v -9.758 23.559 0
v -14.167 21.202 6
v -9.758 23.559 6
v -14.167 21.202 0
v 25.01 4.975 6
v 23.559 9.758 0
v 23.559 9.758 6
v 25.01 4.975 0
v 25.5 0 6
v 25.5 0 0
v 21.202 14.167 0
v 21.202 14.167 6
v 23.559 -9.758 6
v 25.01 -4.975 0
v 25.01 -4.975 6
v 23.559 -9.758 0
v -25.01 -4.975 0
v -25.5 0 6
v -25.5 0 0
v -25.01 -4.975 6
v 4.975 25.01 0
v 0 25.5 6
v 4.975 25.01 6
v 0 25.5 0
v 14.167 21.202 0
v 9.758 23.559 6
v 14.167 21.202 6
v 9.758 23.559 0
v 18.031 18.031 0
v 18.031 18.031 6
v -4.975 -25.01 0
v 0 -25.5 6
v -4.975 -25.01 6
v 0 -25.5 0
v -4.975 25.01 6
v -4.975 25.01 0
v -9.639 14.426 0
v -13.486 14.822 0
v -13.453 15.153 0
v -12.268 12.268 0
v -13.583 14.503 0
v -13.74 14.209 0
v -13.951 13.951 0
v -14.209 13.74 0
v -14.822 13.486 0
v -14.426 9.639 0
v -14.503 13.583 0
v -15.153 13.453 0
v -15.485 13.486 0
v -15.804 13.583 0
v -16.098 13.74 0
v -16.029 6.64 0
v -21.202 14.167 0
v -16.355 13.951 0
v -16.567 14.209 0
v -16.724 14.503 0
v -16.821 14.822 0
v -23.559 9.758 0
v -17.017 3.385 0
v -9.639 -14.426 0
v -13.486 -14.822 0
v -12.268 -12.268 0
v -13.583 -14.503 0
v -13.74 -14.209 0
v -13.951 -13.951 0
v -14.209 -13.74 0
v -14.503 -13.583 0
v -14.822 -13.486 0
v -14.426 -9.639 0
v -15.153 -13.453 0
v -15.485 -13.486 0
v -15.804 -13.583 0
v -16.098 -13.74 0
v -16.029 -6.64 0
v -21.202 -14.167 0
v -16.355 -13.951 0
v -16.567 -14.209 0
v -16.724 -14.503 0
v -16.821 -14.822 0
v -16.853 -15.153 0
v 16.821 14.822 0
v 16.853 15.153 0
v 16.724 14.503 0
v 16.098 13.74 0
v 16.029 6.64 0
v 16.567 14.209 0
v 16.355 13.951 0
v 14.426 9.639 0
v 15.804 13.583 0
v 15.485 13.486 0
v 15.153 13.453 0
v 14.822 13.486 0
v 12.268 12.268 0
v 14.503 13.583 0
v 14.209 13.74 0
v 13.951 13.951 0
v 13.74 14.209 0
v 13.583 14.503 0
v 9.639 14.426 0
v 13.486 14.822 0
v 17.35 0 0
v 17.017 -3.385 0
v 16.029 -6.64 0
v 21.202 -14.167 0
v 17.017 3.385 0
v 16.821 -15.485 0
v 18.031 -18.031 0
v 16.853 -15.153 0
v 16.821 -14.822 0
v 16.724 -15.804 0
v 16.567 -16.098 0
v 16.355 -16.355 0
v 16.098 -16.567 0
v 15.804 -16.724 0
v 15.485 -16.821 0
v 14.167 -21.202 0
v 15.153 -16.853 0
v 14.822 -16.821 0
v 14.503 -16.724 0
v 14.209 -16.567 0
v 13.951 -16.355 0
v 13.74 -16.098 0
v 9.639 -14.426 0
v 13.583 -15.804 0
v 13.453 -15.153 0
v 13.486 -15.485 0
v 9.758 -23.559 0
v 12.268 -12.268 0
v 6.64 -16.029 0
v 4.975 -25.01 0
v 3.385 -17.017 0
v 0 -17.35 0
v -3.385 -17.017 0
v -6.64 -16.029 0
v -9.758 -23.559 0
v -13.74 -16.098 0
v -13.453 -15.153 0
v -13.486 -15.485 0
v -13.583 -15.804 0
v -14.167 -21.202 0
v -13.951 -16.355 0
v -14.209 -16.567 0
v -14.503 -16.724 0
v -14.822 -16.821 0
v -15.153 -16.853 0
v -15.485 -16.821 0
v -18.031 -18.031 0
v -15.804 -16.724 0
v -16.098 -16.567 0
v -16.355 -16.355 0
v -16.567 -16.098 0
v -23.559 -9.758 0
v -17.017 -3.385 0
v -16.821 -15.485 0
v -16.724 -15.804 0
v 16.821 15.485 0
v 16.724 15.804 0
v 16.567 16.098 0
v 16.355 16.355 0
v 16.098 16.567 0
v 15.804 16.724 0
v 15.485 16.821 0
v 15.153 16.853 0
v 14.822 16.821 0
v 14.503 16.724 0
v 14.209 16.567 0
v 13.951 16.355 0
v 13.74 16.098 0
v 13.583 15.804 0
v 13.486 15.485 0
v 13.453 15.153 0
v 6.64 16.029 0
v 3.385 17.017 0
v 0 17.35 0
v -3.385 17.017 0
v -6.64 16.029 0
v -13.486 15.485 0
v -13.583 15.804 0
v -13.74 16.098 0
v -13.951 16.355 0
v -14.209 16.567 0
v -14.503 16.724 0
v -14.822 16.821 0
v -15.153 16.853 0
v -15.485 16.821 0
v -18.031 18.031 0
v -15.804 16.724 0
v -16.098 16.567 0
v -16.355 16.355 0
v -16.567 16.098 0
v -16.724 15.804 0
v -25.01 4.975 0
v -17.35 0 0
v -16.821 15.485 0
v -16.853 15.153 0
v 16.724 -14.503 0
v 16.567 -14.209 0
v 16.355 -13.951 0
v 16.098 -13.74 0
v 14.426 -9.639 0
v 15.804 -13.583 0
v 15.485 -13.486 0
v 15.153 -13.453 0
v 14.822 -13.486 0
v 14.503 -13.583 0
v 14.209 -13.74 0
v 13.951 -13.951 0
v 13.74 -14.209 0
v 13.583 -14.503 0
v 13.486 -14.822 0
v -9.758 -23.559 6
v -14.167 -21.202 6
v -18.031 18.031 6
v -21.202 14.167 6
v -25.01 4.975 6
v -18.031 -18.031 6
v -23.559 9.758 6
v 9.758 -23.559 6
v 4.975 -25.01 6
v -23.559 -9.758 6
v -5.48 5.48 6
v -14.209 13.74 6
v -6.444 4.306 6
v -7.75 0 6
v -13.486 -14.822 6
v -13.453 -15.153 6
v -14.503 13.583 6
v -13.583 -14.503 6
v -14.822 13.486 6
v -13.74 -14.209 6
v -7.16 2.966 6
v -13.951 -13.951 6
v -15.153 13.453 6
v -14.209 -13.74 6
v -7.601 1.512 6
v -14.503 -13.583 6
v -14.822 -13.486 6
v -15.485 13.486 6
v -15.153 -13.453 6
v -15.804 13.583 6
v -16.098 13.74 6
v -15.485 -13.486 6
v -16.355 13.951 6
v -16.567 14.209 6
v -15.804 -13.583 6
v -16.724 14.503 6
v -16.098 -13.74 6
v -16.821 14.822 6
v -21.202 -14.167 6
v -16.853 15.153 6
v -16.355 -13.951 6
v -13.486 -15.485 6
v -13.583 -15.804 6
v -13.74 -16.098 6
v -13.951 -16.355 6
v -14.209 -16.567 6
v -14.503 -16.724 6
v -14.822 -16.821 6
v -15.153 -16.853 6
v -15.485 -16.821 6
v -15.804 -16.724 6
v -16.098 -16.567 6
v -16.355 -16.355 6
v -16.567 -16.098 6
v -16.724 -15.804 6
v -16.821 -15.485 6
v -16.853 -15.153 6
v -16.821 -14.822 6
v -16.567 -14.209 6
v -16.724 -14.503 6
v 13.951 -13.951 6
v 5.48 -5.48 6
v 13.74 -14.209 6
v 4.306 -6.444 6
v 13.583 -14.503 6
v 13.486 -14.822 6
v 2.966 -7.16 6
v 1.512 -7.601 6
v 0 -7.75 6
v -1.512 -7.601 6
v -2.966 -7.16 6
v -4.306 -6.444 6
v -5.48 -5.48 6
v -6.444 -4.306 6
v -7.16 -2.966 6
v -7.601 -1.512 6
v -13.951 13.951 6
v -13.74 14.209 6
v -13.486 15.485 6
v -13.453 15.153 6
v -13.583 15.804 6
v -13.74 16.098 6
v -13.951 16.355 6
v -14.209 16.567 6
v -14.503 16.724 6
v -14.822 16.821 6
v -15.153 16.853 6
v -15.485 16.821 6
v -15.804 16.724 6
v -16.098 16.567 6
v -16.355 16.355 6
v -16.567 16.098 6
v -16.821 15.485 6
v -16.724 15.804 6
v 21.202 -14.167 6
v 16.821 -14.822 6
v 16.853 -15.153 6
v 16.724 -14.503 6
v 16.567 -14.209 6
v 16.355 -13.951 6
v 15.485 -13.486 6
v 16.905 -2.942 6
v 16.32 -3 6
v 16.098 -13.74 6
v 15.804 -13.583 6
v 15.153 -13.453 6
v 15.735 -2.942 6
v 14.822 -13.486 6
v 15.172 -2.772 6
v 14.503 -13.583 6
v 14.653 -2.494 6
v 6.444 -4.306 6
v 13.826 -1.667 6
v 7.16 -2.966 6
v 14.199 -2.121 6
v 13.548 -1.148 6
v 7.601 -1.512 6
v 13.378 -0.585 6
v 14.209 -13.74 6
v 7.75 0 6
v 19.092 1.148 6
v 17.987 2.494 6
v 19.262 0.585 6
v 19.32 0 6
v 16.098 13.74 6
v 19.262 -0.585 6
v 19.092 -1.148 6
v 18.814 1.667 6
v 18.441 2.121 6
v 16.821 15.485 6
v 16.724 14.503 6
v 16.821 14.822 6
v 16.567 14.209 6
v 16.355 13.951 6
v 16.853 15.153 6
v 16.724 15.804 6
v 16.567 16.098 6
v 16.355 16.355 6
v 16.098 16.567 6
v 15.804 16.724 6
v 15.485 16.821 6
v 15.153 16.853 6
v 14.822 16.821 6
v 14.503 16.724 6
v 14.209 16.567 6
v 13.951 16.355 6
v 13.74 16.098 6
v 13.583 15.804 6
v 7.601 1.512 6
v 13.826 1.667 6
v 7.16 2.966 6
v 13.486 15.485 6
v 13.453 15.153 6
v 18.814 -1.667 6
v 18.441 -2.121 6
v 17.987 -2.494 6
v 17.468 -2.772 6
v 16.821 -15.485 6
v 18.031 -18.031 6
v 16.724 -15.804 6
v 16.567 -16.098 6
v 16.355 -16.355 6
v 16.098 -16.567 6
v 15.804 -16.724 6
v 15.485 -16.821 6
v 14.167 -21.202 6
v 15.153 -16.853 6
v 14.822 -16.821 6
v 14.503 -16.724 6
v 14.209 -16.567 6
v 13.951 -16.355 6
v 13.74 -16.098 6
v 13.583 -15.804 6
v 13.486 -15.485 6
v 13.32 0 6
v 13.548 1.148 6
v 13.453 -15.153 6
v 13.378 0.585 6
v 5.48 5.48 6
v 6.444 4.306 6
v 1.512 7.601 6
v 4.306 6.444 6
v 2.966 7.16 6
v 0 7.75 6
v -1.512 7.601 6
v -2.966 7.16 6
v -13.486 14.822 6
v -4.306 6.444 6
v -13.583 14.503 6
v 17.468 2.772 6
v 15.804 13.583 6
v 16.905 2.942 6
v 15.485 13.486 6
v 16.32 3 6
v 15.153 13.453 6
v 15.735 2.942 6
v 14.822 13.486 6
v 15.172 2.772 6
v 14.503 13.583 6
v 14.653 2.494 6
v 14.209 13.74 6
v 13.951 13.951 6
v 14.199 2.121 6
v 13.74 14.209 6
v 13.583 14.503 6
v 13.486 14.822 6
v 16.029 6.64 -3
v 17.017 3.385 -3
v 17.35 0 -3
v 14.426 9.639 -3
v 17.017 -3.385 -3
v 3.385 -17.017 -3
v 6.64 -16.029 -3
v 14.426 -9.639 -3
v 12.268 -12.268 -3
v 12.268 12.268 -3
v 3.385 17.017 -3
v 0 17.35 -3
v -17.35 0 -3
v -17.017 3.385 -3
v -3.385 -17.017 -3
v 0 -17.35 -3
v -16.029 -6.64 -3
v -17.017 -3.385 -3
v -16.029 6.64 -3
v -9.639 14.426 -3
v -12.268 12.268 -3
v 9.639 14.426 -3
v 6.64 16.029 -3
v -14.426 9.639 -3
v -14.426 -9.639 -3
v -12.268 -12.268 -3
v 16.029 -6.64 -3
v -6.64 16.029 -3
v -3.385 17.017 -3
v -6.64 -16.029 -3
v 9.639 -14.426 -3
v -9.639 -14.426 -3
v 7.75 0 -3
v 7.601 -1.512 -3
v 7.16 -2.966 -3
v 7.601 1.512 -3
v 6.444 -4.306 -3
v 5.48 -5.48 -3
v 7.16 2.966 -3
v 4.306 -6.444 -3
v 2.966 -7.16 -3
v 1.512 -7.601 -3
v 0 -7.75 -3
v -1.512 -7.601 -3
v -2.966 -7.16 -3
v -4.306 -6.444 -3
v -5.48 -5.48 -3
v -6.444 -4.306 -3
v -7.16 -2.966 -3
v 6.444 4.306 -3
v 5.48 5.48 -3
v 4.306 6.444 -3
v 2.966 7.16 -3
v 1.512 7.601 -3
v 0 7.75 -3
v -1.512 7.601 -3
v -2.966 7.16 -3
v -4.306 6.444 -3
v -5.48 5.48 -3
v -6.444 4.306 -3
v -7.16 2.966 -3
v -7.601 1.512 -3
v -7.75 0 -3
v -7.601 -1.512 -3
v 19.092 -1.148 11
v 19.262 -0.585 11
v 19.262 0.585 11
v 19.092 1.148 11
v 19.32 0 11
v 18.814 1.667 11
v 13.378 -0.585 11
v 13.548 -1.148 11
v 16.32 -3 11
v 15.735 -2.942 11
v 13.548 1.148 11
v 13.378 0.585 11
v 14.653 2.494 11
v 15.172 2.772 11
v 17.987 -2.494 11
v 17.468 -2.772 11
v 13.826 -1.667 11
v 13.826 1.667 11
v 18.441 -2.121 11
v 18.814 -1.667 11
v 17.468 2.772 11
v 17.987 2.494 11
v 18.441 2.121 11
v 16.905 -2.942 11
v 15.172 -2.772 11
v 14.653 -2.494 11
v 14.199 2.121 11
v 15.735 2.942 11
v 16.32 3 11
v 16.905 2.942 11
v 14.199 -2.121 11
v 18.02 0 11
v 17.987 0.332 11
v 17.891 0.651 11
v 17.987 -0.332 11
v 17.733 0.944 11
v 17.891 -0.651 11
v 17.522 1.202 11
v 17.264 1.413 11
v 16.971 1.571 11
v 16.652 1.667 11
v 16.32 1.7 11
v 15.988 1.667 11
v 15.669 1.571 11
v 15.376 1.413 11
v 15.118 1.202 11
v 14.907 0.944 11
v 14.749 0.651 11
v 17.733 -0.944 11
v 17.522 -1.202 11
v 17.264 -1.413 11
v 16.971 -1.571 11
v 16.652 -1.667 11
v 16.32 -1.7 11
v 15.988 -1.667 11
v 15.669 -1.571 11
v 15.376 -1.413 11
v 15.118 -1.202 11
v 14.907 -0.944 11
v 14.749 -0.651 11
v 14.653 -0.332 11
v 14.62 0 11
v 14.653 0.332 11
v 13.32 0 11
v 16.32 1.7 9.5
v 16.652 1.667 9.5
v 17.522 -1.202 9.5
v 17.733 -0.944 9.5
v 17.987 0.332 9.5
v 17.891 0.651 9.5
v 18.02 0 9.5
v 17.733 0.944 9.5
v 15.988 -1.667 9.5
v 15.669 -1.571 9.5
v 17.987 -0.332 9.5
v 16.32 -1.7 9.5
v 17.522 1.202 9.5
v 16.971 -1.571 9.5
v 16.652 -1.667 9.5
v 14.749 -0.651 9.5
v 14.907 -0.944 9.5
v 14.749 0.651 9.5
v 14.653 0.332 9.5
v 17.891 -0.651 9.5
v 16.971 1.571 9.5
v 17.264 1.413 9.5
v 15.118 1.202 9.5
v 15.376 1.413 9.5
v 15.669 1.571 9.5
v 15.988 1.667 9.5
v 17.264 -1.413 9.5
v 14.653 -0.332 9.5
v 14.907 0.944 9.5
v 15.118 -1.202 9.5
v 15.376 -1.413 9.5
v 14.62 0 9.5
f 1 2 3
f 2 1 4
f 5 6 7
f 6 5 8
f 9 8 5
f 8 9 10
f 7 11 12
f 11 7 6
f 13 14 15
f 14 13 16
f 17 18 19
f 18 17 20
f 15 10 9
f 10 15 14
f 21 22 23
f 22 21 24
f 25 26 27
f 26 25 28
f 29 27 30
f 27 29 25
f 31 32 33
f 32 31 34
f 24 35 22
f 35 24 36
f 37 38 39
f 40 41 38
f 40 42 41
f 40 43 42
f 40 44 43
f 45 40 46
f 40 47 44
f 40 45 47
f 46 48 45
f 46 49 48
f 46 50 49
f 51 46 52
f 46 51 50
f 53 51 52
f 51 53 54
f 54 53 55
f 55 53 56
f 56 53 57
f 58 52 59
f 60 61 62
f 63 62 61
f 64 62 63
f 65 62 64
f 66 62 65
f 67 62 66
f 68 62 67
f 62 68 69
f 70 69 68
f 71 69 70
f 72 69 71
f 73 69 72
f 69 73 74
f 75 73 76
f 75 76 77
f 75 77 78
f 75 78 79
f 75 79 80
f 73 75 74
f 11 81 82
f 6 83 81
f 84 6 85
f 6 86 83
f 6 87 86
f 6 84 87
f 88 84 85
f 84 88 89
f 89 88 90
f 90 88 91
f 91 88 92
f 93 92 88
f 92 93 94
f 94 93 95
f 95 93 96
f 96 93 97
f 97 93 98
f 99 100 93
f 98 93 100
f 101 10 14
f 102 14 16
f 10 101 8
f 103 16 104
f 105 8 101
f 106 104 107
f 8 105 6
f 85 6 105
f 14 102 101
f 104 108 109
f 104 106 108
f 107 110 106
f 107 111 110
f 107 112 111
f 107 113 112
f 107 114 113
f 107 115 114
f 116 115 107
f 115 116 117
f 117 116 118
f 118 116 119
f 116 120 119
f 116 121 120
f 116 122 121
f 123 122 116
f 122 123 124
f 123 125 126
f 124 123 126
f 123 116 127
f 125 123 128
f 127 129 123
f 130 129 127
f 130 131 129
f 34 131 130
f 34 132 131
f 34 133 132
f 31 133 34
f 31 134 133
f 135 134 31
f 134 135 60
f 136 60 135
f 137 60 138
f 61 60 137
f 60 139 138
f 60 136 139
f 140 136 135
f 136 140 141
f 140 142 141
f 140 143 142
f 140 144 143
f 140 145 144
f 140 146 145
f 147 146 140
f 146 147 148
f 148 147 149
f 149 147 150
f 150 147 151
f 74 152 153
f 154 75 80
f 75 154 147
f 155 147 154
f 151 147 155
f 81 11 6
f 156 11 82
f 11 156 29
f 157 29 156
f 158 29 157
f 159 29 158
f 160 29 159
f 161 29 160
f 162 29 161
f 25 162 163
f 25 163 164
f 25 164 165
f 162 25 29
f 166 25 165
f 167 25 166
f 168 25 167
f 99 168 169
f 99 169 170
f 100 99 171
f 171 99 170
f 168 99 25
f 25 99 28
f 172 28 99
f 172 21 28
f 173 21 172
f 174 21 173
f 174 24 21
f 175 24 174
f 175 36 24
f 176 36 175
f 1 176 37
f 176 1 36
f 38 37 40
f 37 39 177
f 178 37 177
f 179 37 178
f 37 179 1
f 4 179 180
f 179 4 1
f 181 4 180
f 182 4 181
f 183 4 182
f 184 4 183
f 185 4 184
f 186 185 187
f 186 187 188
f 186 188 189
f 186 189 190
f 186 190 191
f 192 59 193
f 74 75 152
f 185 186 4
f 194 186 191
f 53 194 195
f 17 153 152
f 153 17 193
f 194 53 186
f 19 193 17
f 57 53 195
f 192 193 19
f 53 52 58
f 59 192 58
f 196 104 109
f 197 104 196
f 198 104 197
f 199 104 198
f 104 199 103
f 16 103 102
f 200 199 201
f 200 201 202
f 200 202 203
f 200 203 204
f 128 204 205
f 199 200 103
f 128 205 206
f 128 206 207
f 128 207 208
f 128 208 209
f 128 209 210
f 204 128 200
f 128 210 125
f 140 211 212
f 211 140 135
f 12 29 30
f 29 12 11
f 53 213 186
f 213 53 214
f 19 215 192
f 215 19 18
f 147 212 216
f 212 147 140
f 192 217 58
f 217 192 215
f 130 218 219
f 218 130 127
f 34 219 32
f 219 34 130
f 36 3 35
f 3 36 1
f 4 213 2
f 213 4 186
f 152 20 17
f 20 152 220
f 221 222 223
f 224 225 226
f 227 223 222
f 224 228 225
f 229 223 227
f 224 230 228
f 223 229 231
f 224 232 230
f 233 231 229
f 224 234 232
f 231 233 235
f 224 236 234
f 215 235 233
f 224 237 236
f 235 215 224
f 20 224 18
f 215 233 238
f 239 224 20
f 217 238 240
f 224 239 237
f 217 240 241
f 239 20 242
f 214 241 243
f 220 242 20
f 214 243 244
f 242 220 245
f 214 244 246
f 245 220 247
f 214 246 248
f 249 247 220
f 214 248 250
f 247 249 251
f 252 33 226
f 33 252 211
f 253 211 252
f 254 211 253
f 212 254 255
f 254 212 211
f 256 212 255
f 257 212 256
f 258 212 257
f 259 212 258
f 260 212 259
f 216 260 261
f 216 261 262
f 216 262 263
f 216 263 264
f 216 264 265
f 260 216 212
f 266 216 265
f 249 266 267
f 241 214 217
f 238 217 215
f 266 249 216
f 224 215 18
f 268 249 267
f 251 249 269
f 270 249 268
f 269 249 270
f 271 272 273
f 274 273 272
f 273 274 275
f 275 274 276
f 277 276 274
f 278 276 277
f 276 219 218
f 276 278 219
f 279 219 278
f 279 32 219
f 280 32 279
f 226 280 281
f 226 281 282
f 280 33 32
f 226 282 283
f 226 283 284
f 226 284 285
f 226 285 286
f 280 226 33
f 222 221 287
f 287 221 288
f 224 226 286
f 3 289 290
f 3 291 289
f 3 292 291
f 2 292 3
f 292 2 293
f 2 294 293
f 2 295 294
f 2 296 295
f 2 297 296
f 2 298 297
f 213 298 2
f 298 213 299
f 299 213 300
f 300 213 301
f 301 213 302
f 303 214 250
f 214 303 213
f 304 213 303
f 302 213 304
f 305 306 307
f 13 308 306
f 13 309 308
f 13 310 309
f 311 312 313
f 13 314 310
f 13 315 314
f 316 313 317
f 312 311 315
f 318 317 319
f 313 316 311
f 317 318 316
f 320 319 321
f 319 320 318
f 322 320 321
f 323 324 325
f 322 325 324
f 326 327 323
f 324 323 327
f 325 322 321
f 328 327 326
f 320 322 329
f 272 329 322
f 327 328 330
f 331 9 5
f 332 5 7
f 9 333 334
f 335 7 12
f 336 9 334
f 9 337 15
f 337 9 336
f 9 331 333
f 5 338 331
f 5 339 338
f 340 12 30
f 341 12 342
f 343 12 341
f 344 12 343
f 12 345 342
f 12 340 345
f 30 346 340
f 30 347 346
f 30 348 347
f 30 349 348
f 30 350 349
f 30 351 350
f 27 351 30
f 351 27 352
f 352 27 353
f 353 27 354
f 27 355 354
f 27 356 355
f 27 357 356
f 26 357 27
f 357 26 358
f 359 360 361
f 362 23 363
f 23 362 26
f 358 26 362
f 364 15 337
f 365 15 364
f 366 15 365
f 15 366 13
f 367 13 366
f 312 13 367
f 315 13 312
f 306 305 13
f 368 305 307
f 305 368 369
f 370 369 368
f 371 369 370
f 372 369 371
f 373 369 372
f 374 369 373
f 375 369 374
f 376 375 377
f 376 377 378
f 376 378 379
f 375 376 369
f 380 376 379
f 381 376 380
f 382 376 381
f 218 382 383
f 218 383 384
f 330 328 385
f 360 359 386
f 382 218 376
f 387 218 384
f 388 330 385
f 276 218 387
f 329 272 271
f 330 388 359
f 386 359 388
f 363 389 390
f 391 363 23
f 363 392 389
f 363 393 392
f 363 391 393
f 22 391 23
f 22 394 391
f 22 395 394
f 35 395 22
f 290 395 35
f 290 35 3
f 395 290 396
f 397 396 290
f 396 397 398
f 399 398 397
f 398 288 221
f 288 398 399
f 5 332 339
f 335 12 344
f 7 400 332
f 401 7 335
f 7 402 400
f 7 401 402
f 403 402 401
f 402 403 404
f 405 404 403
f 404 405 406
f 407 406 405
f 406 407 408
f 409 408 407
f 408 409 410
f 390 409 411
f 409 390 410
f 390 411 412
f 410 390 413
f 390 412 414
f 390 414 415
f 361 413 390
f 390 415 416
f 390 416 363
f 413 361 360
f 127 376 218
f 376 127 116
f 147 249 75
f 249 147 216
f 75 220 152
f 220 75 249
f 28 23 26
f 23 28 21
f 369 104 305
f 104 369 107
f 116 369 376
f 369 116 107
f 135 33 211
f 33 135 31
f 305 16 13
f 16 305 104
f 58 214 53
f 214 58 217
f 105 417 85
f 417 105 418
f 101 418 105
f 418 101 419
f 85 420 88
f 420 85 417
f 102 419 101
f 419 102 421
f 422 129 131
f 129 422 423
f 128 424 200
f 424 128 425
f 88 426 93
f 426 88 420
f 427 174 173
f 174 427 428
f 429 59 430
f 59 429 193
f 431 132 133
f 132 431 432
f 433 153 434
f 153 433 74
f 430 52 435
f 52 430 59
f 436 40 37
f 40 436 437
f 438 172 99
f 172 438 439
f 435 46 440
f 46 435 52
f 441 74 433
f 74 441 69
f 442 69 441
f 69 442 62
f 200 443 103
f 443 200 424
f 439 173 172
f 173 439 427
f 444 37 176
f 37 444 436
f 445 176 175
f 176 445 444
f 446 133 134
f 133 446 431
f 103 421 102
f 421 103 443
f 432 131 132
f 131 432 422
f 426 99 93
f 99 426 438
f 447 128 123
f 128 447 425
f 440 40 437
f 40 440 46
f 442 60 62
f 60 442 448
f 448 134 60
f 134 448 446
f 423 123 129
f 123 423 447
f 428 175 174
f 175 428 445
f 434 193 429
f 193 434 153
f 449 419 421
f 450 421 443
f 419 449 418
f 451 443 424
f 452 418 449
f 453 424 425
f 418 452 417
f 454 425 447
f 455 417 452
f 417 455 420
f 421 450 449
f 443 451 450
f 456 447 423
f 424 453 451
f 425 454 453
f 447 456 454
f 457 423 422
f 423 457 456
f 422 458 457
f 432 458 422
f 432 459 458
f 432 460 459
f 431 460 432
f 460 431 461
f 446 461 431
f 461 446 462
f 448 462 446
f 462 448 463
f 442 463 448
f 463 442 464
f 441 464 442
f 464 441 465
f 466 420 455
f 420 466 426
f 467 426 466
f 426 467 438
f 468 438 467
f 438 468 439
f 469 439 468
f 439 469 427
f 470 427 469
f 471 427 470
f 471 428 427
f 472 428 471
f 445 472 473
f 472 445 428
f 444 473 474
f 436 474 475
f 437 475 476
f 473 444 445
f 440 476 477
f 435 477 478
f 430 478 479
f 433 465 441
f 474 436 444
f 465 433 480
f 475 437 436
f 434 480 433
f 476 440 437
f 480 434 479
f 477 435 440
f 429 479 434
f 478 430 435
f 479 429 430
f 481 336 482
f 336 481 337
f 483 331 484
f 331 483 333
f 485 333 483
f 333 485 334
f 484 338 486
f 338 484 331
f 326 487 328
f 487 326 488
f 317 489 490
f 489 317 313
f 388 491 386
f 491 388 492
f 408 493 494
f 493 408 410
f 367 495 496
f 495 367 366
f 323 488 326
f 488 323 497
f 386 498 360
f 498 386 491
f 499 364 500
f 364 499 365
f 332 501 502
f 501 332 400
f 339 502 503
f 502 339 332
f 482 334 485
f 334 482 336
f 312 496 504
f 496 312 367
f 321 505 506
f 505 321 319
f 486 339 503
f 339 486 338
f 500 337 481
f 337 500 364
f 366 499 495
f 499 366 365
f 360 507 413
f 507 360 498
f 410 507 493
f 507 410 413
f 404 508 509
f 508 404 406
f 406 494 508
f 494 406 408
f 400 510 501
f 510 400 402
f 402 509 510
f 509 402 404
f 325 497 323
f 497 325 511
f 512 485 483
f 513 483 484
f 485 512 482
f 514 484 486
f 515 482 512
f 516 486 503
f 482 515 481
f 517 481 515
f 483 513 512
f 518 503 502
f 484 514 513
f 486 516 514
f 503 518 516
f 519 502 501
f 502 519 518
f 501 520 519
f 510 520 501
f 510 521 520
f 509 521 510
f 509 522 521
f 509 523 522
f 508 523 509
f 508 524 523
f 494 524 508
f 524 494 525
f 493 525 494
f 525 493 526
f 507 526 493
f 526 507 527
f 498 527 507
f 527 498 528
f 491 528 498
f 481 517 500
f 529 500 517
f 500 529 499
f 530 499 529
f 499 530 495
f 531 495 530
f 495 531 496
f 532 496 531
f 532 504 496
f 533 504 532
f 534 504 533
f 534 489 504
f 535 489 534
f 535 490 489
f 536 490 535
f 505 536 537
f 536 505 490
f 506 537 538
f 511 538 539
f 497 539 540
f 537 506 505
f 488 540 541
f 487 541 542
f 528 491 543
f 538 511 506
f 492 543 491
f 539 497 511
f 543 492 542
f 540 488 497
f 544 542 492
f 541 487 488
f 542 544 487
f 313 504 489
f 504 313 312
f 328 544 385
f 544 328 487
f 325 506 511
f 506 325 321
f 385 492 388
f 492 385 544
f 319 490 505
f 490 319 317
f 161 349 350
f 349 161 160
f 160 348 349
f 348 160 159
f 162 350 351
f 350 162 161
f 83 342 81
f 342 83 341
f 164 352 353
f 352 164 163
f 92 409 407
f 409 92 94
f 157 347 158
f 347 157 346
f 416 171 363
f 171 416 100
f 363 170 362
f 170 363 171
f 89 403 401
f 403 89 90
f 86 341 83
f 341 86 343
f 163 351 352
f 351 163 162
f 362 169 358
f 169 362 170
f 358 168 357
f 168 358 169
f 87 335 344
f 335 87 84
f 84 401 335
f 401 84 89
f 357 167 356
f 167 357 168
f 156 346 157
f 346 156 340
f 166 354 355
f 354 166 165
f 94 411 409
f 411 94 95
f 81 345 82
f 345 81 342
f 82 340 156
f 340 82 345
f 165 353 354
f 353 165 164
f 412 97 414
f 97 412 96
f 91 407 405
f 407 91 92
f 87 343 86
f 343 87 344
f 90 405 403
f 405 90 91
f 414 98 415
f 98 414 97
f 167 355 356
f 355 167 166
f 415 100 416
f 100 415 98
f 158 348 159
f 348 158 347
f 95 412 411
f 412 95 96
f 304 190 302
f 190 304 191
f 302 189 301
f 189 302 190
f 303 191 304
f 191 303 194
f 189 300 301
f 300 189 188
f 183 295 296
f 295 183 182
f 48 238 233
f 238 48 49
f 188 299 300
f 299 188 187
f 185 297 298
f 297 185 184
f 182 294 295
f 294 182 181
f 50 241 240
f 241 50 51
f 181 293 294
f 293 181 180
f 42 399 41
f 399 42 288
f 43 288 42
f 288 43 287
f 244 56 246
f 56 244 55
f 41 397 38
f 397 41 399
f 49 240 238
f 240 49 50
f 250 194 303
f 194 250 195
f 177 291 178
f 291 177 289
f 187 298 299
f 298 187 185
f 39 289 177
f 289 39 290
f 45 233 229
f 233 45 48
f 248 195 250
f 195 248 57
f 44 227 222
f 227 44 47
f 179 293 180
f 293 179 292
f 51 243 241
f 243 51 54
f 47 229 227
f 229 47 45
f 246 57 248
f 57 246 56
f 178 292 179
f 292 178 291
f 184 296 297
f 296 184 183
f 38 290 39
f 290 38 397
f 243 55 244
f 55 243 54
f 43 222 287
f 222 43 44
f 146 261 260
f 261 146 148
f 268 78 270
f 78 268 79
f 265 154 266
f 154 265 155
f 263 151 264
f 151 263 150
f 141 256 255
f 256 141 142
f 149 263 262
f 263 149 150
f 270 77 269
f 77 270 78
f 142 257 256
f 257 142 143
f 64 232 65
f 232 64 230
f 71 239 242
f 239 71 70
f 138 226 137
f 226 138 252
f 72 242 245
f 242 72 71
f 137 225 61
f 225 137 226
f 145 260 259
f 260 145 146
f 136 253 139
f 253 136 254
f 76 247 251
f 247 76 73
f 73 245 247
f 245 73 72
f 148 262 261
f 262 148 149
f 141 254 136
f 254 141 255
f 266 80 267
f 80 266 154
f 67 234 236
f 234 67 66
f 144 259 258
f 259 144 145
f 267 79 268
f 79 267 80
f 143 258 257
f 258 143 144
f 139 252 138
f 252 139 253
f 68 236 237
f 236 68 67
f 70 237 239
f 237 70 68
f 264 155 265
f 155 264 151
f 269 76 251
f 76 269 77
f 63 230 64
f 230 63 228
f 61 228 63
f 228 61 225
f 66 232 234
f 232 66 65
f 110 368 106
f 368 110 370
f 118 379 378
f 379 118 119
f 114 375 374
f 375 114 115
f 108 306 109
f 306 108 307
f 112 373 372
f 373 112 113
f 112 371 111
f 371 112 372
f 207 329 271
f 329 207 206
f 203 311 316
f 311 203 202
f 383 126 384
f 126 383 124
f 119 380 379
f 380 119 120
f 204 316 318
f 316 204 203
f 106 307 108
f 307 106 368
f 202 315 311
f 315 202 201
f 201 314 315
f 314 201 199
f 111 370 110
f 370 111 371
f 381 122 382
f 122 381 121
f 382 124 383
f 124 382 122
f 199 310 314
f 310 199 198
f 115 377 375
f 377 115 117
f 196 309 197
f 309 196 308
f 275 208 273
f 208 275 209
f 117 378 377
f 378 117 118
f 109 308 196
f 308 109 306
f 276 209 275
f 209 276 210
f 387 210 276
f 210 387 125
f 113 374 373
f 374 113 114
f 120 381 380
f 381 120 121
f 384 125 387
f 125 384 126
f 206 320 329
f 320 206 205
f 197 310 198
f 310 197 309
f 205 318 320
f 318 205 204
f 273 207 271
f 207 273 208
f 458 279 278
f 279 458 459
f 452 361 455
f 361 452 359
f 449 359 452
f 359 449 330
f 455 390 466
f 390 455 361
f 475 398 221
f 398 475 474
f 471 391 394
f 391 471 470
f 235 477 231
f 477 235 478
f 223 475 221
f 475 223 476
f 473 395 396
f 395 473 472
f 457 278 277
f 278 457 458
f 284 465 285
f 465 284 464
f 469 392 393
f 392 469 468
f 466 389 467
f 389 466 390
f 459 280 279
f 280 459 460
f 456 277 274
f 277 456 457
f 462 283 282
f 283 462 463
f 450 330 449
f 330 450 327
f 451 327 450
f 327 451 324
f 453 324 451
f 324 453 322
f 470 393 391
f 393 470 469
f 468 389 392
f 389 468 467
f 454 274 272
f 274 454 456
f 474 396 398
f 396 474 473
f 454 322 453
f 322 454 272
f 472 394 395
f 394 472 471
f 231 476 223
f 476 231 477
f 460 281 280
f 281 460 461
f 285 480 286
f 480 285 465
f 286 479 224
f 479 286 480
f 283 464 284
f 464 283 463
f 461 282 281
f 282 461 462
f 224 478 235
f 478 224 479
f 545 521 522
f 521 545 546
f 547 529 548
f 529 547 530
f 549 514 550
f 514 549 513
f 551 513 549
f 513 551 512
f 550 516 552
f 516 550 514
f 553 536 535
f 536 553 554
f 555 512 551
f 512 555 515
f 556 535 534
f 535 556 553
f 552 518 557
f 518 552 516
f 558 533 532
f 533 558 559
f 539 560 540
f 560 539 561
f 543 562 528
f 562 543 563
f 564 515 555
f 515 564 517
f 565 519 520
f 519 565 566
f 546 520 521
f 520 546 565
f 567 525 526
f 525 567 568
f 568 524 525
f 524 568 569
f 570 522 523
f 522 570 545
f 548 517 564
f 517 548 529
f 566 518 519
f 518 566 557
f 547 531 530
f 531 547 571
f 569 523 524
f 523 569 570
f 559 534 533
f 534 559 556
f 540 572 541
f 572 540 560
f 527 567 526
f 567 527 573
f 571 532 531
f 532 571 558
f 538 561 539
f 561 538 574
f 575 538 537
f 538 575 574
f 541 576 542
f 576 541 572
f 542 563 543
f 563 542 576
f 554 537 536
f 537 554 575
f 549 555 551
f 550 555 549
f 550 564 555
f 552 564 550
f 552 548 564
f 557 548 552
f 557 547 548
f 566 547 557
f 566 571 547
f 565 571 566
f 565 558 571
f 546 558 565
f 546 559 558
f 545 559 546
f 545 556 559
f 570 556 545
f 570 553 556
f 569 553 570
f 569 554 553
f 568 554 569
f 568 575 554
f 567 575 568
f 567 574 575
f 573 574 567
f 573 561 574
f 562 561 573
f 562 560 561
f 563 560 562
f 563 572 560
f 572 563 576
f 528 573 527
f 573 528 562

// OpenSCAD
$fn = 32;

// ----------------------------------------------------------------------
// Retaining cap: 6202 cover, 51 mm, spigot 34.7 mm
// ----------------------------------------------------------------------

// --- parameters (mm) ---
cover_d = 51;             // cover diameter
cover_t = 6;              // cover thickness
spigot_d = 34.7;          // spigot that enters the housing
spigot_h = 3;             // spigot height
shaft_d = 15.5;           // shaft opening
bolt_d = 3.4;             // bolt clearance
bolt_r = 21.43;           // bolt circle radius
nipple_d = 6;             // grease nipple boss
nipple_h = 5;             // grease nipple boss height

module cover() {
  cylinder(h = cover_t, d = cover_d);
}

module spigot() {
  /* sunk 1 mm into the cover; the spigot sets the overall height */
  translate([0, 0, -spigot_h]) cylinder(h = spigot_h + 1, d = spigot_d);
}

module nipple() {
  translate([cover_d * 0.32, 0, cover_t - 1])
    cylinder(h = nipple_h + 1, d = nipple_d);
}

difference() {
  union() {
    cover();
    spigot();
    nipple();
  }
  for (i = [0 : 3]) rotate([0, 0, 45 + i * 90]) translate([bolt_r, 0, -spigot_h - 1])
    cylinder(h = spigot_h + cover_t + 2, d = bolt_d);
  translate([0, 0, -spigot_h - 1]) cylinder(h = spigot_h + cover_t + 2, d = shaft_d);
  translate([cover_d * 0.32, 0, cover_t + nipple_h - 1.5]) cylinder(h = 4, d = 3.4);
}
